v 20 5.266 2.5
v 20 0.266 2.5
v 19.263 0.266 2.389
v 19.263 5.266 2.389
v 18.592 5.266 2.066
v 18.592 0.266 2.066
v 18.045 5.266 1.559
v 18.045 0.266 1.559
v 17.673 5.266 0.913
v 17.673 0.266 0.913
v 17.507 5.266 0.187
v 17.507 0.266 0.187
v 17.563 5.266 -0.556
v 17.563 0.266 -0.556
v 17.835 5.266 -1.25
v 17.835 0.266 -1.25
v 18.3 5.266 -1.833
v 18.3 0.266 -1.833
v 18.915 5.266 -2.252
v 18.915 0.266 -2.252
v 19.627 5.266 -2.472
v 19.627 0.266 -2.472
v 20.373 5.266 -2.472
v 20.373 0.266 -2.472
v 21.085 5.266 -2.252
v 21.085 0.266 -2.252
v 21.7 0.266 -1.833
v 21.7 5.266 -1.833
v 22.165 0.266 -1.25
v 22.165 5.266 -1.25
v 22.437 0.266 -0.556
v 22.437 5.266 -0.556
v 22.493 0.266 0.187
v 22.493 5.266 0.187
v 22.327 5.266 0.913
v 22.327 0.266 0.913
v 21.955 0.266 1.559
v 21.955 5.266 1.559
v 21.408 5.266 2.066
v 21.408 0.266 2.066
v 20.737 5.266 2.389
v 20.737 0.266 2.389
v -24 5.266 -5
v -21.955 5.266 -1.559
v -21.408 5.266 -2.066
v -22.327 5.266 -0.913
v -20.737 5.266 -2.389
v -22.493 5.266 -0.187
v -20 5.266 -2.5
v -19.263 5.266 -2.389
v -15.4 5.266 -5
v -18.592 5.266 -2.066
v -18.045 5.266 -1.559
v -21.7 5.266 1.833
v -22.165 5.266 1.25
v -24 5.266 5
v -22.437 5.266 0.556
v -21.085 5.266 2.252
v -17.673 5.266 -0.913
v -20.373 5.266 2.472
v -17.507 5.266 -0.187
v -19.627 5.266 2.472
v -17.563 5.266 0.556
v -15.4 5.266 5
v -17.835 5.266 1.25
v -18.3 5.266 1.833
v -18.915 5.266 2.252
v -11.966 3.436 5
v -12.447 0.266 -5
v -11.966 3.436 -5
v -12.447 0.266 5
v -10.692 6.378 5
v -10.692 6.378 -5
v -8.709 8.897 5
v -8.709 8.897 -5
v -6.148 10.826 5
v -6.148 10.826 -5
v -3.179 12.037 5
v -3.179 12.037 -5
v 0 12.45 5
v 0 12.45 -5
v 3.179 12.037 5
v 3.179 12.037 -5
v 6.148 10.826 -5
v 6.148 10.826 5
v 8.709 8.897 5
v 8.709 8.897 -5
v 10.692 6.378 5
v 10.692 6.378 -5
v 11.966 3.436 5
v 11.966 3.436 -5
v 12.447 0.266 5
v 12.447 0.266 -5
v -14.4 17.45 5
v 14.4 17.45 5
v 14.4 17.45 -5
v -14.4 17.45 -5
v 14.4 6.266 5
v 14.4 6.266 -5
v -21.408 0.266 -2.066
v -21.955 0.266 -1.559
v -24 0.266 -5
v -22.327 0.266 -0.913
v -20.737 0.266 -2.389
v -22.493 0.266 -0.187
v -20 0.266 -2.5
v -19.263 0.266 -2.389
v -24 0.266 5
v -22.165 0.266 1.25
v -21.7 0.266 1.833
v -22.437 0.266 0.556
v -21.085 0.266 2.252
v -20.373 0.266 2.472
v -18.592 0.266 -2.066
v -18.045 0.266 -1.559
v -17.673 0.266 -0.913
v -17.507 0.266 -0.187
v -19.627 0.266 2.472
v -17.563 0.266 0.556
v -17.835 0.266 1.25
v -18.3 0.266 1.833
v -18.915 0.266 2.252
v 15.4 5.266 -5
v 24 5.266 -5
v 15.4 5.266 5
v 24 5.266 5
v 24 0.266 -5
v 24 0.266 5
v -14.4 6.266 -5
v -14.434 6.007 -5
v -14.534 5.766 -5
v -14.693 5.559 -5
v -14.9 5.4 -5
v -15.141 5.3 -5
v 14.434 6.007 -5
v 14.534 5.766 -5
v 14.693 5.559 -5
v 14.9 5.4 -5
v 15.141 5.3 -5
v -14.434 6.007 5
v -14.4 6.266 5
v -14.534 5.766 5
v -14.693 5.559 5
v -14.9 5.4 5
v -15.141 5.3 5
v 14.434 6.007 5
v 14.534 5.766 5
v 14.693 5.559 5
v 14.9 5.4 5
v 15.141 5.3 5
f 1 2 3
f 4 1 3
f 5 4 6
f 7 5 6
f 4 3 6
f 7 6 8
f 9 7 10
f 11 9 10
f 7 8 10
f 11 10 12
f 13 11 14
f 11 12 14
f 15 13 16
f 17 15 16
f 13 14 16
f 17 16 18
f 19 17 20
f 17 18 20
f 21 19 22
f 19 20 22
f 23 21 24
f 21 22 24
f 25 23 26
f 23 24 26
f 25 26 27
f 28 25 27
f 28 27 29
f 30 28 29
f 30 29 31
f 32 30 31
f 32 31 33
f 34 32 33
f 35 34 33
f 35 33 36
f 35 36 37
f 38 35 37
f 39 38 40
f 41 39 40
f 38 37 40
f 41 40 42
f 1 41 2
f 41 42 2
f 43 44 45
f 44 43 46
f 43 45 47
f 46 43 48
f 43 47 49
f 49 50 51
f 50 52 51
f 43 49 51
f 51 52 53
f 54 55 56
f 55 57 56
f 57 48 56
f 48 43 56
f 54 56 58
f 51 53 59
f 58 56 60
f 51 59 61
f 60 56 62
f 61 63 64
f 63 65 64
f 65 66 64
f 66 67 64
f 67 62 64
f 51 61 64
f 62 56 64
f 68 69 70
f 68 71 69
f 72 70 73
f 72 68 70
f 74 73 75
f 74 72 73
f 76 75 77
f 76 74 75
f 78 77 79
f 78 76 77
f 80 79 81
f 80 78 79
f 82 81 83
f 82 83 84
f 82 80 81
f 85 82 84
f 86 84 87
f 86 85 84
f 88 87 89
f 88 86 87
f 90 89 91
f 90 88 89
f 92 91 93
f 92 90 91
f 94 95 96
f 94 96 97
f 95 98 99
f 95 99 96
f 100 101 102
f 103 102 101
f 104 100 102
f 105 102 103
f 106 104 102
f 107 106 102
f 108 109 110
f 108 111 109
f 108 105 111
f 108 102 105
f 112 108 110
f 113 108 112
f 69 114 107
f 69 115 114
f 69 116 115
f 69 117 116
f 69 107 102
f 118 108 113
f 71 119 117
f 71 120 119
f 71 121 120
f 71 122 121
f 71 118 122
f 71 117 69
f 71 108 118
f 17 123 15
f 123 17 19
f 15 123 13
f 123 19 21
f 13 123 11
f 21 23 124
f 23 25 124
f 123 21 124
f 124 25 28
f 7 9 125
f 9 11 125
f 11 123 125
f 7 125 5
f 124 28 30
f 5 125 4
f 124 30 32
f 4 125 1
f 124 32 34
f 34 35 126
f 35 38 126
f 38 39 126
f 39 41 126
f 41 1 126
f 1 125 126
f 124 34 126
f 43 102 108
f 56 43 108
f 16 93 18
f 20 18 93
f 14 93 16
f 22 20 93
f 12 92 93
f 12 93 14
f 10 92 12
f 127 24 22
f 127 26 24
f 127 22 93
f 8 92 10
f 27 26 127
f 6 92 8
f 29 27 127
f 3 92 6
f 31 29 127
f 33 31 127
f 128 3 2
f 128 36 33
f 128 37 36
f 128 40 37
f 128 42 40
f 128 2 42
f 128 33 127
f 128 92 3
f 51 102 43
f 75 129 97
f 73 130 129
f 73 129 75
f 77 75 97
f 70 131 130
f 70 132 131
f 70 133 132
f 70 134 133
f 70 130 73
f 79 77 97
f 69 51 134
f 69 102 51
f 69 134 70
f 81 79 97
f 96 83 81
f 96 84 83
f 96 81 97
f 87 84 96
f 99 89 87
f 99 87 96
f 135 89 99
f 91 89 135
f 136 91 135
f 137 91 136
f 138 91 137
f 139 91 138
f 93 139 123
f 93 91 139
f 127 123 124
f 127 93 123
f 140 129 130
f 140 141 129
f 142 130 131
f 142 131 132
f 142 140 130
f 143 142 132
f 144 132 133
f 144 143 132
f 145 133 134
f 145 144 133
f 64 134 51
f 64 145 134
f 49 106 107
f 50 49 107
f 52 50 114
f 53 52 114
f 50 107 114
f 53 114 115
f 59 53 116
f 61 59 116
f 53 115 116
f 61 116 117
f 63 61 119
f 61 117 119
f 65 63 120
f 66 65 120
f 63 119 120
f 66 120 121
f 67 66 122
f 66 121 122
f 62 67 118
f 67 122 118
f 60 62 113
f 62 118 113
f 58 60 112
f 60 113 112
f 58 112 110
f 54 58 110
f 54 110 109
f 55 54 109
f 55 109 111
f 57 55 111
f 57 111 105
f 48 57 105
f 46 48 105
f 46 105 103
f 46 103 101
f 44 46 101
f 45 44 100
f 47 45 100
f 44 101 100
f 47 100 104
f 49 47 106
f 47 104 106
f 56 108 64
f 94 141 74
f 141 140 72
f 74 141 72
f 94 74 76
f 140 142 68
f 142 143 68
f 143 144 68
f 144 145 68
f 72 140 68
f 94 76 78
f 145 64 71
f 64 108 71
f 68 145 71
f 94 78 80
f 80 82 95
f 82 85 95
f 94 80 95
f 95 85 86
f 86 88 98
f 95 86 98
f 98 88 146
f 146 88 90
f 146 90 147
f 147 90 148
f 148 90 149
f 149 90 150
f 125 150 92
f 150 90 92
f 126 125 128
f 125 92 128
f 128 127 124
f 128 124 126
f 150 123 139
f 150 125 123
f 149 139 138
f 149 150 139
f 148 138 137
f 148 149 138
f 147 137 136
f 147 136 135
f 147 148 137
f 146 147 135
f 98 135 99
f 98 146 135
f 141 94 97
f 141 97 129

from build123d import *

# Parameters (mm, degrees)
EXTRUDE_1_DEPTH = 5
SKETCH_3_W      = 9.6
SKETCH_3_H      = 10
SKETCH_3_R      = 2.5
EXTRUDE_2_DEPTH = 5
FILLET_1_R      = 1


with BuildPart() as part:
    # 草图1 → 凸台-拉伸1 (new, symmetric)
    with BuildSketch(Plane.XY):
        with BuildLine():
            Line((12.447157347, 0.266033793), (14.4, 0.266033793))
            Line((14.4, 0.266033793), (14.4, 17.45))
            Line((14.4, 17.45), (-14.4, 17.45))
            Line((-14.4, 17.45), (-14.4, 0.266033793))
            Line((-14.4, 0.266033793), (-12.447157347, 0.266033793))
            ThreePointArc((-12.447157347, 0.266033793), (0, 12.45), (12.447157347, 0.266033793))
        make_face()
    extrude(amount=EXTRUDE_1_DEPTH, both=True)

    # 草图3 → 凸台-拉伸2 (add)
    # profile 1 of 2: a face of its own
    with BuildSketch(Plane.XZ.offset(-0.266033793)):
        with Locations((19.2, 0)):
            Rectangle(SKETCH_3_W, SKETCH_3_H)
        with Locations(Location((20, 0, 0), (0, 0, 90))):
            Circle(SKETCH_3_R, mode=Mode.SUBTRACT)
    # profile 2 of 2: a face of its own
    with BuildSketch(Plane.XZ.offset(-0.266033793)):
        with Locations((-19.2, 0)):
            Rectangle(SKETCH_3_W, SKETCH_3_H)
        with Locations(Location((-20, 0, 0), (0, 0, 270))):
            Circle(SKETCH_3_R, mode=Mode.SUBTRACT)
    extrude(amount=-EXTRUDE_2_DEPTH)

    # 圆角1
    fillet_1_edges = [part.edges().sort_by_distance(p)[0] for p in [
        (14.4, 5.266033793, 0),
        (-14.4, 5.266033793, 0),
    ]]
    fillet(fillet_1_edges, radius=FILLET_1_R)


solid = part.part
